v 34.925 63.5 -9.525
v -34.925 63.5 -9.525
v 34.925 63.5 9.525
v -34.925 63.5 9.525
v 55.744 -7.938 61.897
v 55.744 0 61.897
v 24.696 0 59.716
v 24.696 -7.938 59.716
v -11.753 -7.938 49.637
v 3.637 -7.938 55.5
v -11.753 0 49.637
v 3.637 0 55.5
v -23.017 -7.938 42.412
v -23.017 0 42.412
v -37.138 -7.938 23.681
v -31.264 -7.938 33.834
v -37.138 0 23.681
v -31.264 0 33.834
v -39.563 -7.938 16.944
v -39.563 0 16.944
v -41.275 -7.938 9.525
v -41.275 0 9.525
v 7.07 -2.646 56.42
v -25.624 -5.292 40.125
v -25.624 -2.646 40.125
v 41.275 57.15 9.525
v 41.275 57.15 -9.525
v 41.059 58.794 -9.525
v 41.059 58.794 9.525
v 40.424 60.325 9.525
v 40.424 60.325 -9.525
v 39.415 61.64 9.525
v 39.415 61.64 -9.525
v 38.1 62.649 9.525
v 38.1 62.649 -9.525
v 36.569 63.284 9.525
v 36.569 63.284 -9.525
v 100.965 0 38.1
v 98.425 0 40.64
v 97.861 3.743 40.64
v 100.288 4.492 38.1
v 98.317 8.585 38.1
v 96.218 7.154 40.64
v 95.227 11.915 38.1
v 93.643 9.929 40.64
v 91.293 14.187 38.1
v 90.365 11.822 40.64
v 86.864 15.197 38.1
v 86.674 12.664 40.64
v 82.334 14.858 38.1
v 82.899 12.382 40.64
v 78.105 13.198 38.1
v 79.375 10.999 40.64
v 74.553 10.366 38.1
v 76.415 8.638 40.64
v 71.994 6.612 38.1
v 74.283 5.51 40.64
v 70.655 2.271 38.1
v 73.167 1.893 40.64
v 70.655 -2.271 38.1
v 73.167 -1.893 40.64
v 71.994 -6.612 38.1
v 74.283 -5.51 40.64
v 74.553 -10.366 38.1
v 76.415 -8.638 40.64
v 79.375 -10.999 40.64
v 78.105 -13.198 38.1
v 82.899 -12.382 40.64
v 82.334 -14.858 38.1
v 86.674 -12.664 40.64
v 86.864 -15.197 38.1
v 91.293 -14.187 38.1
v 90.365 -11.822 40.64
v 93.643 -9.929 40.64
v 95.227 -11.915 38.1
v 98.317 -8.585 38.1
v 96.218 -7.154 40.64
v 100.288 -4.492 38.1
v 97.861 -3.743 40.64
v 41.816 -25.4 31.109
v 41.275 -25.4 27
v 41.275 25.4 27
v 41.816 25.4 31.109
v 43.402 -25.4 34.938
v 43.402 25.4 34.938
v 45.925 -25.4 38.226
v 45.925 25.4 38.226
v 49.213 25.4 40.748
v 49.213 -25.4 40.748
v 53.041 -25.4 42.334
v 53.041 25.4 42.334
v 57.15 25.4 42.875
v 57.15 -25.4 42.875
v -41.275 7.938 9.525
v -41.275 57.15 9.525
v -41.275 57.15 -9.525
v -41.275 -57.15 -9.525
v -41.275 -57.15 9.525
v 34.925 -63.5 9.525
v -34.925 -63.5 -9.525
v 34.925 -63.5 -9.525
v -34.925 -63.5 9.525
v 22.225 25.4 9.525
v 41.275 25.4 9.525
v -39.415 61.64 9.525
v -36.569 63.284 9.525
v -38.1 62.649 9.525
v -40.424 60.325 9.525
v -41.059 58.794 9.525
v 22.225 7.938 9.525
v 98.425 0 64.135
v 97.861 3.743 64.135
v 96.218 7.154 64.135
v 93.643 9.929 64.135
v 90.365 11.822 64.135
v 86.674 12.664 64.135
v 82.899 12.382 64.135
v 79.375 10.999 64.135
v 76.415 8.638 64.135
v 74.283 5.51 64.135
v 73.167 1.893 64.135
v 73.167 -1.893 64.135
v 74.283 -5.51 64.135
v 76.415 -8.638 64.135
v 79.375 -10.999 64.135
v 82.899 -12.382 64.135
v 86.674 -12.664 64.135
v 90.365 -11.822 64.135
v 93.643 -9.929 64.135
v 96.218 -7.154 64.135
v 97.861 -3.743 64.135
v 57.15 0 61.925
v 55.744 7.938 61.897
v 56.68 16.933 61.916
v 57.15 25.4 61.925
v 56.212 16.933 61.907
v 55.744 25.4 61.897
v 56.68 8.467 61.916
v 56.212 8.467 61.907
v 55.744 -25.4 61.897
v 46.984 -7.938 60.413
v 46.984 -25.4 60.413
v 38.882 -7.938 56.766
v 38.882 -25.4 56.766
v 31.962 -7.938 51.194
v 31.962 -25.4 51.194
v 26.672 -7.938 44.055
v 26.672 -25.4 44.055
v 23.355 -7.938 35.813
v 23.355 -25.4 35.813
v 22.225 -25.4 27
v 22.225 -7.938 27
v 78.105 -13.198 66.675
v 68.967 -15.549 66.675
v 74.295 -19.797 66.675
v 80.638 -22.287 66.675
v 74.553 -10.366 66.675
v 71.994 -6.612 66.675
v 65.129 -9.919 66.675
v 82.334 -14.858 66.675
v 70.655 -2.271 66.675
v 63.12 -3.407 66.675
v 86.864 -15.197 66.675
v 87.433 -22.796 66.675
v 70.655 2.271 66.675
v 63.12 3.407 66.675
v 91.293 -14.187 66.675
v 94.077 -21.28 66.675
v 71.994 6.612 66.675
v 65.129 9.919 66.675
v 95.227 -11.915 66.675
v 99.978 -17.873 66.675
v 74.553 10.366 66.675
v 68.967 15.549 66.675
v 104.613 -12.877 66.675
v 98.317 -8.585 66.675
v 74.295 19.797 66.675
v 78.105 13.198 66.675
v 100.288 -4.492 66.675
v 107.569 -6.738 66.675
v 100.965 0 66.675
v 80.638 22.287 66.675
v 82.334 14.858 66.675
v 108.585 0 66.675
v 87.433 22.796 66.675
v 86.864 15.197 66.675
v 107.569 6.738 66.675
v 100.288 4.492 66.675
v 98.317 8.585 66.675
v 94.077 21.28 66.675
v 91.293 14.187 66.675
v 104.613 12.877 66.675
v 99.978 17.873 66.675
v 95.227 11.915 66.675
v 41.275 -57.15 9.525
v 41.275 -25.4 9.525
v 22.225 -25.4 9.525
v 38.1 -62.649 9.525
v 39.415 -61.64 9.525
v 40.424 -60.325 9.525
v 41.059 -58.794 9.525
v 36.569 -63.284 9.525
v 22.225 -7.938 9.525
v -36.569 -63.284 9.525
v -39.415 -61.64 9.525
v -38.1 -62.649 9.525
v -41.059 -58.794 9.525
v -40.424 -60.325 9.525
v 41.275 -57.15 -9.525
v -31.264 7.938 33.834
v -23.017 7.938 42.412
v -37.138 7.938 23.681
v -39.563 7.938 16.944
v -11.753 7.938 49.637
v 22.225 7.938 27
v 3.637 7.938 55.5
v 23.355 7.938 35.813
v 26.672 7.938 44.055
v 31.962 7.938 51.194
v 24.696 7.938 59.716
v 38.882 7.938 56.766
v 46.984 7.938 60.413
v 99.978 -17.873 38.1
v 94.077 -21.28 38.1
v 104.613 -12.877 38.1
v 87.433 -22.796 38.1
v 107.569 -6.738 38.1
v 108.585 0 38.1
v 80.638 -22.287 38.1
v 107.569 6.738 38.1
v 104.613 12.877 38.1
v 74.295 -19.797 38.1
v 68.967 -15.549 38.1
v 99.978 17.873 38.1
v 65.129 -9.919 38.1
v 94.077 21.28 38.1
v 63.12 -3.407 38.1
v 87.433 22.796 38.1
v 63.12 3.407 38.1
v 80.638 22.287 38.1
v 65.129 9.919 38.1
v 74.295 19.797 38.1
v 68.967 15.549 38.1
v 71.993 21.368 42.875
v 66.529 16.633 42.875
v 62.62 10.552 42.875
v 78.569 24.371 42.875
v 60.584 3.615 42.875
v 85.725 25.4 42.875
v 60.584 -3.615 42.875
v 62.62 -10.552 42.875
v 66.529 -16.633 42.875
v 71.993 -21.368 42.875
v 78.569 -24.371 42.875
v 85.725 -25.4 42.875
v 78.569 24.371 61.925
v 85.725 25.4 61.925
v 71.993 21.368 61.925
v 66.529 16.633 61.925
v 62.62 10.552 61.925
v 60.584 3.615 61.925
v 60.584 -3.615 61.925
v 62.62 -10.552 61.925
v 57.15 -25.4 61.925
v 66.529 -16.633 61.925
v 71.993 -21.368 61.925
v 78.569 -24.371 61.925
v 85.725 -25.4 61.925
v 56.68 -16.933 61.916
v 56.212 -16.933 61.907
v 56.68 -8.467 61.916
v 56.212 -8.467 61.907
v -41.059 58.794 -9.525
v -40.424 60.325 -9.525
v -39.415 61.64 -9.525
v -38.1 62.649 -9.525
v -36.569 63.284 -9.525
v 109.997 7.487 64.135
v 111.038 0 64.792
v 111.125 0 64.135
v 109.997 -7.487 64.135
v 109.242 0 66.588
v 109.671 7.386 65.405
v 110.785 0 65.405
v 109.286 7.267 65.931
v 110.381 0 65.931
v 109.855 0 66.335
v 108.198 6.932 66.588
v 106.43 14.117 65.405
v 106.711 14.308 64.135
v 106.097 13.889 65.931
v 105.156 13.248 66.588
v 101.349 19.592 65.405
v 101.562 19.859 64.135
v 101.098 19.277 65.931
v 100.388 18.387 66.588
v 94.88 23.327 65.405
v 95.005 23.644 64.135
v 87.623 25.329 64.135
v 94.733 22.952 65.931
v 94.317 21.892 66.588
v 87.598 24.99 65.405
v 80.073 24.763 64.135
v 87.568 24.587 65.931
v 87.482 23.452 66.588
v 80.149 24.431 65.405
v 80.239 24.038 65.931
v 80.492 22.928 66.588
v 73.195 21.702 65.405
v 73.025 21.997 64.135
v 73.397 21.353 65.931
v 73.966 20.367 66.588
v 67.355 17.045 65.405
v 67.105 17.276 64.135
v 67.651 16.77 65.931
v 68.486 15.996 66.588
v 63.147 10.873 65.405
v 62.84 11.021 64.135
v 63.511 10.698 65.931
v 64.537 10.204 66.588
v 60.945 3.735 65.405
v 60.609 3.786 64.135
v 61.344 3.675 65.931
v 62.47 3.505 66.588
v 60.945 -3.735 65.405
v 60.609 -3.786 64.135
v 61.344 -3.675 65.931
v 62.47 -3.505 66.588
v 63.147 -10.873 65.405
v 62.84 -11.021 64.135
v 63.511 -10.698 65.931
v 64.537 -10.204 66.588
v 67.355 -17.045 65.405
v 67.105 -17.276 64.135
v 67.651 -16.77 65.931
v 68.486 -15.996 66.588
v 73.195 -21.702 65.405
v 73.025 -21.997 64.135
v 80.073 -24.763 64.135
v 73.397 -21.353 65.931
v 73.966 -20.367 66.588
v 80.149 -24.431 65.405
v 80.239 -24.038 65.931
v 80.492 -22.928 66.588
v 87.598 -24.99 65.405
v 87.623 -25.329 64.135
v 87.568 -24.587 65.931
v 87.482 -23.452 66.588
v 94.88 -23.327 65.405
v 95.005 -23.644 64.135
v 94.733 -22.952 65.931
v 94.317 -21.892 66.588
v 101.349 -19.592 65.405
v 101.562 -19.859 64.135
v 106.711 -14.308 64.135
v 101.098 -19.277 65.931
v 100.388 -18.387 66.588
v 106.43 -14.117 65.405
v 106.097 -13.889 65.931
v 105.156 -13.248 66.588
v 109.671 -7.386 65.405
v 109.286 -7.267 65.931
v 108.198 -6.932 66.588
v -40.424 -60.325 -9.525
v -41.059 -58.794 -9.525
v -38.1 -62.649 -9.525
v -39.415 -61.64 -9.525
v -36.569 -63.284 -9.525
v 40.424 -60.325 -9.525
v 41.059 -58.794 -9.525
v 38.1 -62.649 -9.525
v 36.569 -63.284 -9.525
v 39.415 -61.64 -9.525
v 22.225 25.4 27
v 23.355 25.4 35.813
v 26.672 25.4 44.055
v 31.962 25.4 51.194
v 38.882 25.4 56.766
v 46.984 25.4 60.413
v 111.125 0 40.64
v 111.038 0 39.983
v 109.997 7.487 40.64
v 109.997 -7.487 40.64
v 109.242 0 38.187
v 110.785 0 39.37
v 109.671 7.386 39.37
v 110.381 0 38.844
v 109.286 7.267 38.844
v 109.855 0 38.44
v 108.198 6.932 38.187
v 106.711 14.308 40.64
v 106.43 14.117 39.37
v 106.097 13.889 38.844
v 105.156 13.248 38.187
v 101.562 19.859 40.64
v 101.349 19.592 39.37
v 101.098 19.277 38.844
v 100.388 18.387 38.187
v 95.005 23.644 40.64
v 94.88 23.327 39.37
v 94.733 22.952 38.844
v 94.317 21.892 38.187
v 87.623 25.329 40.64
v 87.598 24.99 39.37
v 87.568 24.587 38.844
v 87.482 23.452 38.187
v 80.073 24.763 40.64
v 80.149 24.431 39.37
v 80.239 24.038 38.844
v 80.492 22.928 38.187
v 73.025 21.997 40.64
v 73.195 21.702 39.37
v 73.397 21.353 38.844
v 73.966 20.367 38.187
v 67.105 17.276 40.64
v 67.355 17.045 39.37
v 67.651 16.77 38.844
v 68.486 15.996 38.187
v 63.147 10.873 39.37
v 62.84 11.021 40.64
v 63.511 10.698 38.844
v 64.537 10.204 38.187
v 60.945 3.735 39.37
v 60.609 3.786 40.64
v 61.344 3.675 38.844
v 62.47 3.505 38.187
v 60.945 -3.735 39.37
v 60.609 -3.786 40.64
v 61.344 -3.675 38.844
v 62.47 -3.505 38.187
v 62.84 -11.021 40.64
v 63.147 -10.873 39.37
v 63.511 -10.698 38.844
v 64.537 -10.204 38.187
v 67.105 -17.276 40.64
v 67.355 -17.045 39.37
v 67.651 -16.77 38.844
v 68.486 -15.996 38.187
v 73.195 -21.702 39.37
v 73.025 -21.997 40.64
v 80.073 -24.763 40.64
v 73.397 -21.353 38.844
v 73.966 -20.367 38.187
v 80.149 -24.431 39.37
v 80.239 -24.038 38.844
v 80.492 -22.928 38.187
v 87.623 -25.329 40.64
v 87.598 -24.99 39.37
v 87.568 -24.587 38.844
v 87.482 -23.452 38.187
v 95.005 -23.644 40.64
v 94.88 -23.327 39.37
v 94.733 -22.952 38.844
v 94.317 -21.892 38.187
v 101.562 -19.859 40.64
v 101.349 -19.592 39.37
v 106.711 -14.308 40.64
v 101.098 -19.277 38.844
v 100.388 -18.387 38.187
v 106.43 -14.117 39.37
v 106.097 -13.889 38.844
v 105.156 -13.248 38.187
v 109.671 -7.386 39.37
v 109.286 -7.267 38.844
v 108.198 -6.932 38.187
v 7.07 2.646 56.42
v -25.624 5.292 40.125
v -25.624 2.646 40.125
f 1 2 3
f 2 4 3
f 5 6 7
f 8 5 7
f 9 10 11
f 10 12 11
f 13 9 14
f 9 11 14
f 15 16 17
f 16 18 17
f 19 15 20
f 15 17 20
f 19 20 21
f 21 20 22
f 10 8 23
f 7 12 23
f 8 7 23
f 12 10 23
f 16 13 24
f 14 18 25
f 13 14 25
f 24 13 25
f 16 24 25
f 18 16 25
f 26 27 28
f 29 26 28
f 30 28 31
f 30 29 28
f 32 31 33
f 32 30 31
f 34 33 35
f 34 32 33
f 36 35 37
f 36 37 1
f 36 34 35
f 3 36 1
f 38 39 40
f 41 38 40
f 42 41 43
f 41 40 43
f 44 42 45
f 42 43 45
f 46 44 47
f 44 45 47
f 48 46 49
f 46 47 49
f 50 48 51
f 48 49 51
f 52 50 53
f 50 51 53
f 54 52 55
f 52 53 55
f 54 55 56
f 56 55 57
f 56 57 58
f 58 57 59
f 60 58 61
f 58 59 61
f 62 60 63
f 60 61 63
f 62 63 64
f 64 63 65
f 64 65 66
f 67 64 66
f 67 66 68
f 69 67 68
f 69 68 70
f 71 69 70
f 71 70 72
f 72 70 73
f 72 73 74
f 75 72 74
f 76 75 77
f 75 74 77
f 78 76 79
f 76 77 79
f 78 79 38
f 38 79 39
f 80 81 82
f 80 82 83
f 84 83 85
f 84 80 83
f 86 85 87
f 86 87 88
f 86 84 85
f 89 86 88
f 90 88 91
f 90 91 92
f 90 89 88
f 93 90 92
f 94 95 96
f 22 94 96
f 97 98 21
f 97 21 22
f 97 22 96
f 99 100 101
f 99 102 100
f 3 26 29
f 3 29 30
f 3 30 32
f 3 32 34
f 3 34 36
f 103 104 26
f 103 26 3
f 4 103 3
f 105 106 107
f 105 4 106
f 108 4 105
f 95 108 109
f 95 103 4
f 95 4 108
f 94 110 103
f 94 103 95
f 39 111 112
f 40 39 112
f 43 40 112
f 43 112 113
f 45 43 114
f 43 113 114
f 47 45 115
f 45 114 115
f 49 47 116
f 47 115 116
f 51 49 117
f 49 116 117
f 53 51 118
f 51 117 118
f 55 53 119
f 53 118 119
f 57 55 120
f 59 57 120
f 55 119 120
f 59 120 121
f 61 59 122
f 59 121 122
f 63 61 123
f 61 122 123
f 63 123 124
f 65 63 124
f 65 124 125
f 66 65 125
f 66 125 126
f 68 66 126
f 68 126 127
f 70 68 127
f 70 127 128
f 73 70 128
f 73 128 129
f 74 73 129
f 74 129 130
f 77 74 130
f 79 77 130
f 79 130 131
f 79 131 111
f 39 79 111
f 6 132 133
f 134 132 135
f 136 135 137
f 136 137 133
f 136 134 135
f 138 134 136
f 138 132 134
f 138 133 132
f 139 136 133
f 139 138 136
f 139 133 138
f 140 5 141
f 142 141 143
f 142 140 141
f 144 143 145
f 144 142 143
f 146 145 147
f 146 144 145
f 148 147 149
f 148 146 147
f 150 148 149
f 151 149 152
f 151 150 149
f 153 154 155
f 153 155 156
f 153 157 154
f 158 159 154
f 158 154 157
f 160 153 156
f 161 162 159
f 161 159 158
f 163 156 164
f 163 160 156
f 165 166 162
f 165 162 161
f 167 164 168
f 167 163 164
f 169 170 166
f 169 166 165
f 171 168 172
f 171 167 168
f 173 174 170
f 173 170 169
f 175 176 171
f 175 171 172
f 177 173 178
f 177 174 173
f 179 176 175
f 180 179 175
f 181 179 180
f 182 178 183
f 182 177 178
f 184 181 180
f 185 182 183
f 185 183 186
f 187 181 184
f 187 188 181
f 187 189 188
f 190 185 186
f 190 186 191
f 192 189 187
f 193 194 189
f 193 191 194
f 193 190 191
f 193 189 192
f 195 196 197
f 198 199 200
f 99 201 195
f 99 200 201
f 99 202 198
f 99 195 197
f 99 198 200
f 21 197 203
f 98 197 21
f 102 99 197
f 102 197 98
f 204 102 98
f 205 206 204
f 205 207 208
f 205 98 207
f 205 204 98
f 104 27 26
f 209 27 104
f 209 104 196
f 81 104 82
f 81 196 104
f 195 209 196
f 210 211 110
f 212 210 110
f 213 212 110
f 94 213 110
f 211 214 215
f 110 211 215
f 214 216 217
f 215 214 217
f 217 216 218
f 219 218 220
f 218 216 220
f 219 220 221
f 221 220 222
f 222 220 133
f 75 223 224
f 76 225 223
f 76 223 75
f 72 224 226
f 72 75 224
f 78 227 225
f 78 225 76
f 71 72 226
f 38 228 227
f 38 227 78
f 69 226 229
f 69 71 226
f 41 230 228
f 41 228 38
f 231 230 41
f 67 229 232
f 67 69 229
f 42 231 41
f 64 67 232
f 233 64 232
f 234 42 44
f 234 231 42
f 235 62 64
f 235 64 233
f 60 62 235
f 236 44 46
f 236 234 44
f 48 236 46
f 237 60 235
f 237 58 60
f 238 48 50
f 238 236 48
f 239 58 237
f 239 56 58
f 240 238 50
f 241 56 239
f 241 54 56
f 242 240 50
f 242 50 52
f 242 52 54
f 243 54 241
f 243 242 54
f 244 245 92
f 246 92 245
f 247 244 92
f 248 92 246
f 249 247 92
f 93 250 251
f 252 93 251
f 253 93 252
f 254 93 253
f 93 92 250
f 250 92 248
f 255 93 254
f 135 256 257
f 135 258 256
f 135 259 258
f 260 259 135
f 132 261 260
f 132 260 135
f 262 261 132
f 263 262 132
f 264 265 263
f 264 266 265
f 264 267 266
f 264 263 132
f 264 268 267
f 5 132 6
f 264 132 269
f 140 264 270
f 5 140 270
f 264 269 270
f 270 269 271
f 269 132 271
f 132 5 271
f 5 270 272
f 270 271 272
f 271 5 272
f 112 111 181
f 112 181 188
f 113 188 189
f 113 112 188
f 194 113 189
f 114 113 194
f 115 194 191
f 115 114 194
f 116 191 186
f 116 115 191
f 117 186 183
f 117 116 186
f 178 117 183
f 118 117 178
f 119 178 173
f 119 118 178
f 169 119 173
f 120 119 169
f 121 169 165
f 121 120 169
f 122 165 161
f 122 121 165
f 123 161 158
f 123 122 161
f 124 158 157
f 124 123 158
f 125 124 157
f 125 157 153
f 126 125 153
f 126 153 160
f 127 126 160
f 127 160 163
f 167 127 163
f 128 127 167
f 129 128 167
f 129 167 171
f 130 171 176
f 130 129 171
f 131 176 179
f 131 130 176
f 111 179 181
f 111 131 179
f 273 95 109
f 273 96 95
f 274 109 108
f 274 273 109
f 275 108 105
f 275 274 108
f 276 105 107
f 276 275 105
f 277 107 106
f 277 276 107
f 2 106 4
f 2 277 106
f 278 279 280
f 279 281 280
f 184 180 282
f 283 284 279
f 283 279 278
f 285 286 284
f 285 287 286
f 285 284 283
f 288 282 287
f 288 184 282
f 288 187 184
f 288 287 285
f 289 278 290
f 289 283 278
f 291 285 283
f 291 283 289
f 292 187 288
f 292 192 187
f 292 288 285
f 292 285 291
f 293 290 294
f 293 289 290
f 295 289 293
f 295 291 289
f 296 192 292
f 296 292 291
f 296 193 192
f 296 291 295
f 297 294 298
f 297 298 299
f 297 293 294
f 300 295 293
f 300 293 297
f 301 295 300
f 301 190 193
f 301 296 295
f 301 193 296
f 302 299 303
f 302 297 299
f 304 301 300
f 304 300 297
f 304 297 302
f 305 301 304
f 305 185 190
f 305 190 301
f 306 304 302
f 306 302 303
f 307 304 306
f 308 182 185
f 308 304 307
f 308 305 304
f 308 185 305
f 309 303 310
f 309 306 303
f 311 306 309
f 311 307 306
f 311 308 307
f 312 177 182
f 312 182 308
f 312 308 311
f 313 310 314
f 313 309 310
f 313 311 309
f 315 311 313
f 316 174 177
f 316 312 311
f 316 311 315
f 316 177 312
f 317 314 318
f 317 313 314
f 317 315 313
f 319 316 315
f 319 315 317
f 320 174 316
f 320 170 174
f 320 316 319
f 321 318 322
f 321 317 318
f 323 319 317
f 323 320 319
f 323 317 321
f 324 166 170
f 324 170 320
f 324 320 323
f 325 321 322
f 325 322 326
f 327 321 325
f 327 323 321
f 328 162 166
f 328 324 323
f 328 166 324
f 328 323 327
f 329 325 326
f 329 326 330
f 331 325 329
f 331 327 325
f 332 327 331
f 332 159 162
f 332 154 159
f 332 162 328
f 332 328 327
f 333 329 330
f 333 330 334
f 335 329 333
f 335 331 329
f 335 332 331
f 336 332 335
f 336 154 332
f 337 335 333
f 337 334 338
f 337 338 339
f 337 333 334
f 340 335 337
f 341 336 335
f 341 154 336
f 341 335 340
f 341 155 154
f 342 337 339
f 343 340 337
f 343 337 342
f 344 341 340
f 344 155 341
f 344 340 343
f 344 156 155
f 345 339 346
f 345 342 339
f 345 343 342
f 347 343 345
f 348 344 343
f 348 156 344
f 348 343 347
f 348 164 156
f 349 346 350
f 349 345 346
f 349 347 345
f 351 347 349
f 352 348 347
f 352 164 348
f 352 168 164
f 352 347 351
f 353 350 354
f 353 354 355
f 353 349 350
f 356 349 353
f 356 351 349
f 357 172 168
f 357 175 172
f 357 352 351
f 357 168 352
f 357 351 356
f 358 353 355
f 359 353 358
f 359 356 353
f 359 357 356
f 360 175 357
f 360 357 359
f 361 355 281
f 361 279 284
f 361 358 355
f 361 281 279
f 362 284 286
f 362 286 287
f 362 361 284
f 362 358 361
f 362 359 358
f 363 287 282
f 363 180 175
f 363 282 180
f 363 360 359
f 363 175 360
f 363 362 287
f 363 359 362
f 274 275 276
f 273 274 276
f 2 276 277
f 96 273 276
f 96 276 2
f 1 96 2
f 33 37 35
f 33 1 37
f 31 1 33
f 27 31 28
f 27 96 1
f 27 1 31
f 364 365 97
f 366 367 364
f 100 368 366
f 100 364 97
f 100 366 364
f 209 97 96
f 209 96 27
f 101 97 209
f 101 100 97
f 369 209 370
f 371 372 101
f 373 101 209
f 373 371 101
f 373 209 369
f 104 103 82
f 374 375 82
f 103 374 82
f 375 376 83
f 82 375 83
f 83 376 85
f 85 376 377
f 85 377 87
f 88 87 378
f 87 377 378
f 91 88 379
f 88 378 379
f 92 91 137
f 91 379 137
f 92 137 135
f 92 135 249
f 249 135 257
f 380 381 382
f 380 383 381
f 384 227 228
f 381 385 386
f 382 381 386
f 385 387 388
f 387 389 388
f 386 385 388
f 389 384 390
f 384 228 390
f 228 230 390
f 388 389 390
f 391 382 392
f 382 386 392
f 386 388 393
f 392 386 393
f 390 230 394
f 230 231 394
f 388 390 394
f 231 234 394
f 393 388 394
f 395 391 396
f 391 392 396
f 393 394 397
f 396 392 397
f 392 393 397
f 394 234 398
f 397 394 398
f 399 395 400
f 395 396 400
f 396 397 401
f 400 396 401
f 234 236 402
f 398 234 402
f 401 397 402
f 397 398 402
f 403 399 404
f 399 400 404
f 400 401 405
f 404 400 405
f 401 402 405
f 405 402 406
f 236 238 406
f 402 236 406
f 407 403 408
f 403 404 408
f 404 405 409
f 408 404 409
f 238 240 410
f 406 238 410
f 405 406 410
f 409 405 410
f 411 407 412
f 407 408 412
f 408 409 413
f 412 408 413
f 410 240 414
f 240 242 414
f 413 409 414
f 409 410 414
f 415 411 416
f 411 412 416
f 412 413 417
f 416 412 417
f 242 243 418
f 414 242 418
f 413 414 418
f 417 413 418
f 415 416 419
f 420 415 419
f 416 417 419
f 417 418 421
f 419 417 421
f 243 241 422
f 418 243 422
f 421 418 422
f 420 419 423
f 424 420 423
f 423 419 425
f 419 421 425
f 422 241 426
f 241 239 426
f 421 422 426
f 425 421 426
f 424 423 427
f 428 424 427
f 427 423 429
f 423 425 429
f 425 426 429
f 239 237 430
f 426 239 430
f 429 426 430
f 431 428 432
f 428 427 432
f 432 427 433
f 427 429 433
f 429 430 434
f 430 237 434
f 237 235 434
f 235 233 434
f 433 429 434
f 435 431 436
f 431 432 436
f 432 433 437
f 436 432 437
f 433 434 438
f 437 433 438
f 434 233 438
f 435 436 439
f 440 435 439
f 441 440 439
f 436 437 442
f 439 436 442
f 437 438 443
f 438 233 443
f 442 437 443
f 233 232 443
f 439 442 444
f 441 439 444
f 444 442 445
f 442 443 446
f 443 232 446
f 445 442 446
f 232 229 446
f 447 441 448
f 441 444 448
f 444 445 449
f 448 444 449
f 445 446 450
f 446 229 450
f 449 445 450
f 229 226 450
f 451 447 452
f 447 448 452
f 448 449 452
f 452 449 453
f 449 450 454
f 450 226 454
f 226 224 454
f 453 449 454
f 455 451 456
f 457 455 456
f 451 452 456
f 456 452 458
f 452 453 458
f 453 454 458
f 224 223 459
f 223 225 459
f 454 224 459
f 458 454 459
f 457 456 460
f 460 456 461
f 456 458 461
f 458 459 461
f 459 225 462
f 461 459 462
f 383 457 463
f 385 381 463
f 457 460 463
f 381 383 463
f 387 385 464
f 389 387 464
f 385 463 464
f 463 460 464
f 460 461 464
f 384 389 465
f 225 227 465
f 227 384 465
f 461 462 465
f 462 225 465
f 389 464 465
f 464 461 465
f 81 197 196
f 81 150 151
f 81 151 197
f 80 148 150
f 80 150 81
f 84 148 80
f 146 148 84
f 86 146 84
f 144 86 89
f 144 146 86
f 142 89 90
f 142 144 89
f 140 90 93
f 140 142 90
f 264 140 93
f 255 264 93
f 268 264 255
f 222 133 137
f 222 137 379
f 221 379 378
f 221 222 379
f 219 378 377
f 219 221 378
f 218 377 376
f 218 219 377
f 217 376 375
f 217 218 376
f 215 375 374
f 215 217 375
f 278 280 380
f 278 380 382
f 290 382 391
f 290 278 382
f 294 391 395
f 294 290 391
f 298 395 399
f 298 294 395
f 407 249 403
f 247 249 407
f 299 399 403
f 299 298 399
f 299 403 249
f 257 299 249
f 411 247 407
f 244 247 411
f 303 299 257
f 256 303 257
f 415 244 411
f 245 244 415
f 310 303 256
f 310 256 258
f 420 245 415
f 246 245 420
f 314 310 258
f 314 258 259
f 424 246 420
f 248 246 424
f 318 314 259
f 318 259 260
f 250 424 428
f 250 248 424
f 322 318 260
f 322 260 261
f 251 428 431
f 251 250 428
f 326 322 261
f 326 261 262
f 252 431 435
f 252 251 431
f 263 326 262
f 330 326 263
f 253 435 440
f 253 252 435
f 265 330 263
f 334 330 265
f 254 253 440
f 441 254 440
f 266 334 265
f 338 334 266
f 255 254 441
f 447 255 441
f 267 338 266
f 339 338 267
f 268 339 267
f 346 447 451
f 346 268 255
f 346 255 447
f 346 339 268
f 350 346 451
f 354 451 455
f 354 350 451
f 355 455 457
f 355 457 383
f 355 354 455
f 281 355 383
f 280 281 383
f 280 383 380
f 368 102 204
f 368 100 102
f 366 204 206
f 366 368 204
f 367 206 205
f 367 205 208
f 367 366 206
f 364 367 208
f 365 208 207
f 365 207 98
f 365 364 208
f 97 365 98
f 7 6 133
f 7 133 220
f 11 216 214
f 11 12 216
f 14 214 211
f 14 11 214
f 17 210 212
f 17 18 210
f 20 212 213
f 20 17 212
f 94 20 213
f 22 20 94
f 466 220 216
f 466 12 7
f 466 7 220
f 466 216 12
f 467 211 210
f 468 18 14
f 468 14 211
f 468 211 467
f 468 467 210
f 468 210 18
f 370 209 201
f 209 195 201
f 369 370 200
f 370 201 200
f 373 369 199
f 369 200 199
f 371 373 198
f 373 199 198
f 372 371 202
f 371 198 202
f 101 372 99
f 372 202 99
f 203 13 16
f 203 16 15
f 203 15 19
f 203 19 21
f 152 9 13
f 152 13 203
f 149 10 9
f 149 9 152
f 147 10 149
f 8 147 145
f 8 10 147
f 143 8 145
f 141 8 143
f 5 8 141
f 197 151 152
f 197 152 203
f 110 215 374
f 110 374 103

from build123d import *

# Parameters (mm, degrees)
F1_DEPTH = 63.5
F0_W     = 25.4
F0_H     = 19.05
F2_DEPTH = 25.4
F3_DEPTH = 7.9375
F5_R     = 6.35
F6_R     = 12.7
F7_DEPTH = 76.201
F8_R     = 2.54
F9_SIZE  = 2.54


with BuildPart() as f1:
    # F0 (on Front) → F1 (new body, symmetric)
    with BuildSketch(Plane.XZ):
        Polygon((-41.275, -9.525), (41.275, -9.525), (41.275, 9.525), (22.225, 9.525), (-41.275, 9.525), align=None)
    extrude(amount=F1_DEPTH, both=True)

    # F0 (on Front) → F2 (join, symmetric)
    with BuildSketch(Plane.XZ):
        with BuildLine():
            Line((22.225, 9.525), (41.275, 9.525))
            Line((41.275, 9.525), (41.275, 27.0002))
            ThreePointArc((41.275, 27.0002), (45.9246798487, 38.2255201513), (57.15, 42.8752))
            Line((57.15, 42.8752), (60.325, 42.8752))
            Line((60.325, 42.8752), (60.325, 61.9252))
            Line((60.325, 61.9252), (57.15, 61.9252))
            add(Edge.make_bspline(
                [(57.15, 61.9252), (56.6797844251, 61.9165132353), (56.2111060081, 61.9070782377), (55.7439674805, 61.896886054)],
                knots=[0, 0, 0, 0, 0.9174307887, 0.9174307887, 0.9174307887, 0.9174307887], degree=3))
            ThreePointArc((55.7439674805, 61.896886054), (31.9620930728, 51.1936902325), (22.225, 27.0002))
            Line((22.225, 27.0002), (22.225, 9.525))
        make_face()
        with Locations((73.025, 52.4002)):
            Rectangle(F0_W, F0_H)
    extrude(amount=F2_DEPTH, both=True)

    # F0 (on Front) → F3 (join, symmetric)
    with BuildSketch(Plane.XZ):
        with BuildLine():
            add(Edge.make_bspline(
                [(55.7439674805, 61.896886054), (-0.5649096696, 60.6683202624), (-34.4993601081, 48.437924622), (-41.275, 9.525)],
                knots=[0.9174307887, 0.9174307887, 0.9174307887, 0.9174307887, 111.5045361635, 111.5045361635, 111.5045361635, 111.5045361635], degree=3))
            Line((-41.275, 9.525), (22.225, 9.525))
            Line((22.225, 9.525), (22.225, 27.0002))
            ThreePointArc((22.225, 27.0002), (31.9620930728, 51.1936902325), (55.7439674805, 61.896886054))
        make_face()
    extrude(amount=F3_DEPTH, both=True)

    # F0 (on Front) → F4 (revolve)
    with BuildSketch(Plane.XZ):
        Polygon((85.725, 61.9252), (85.725, 42.8752), (85.725, 38.1), (111.125, 38.1), (111.125, 66.675), (85.725, 66.675), align=None)
    revolve(axis=Axis((85.725, 0, 52.3875), (0, 0, 1)))

    # F5
    f5_edges = [f1.edges().sort_by_distance(p)[0] for p in [
        (-41.275, -63.5, 0),
        (41.275, -63.5, 0),
        (41.275, 63.5, 0),
        (-41.275, 63.5, 0),
    ]]
    fillet(f5_edges, radius=F5_R)

    # F6 (on face) → F7 (cut, through all)
    with BuildSketch(Plane.XY.offset(66.675)):
        with Locations((85.725, 0)):
            Circle(F6_R)
    extrude(amount=-F7_DEPTH, mode=Mode.SUBTRACT)

    # F8
    f8_edges = [f1.edges().sort_by_distance(p)[0] for p in [
        (60.325, 0, 66.675),
        (60.325, 0, 38.1),
    ]]
    fillet(f8_edges, radius=F8_R)

    # F9
    f9_edges = [f1.edges().sort_by_distance(p)[0] for p in [
        (73.025, 0, 66.675),
        (73.025, 0, 38.1),
    ]]
    chamfer(f9_edges, length=F9_SIZE)


solid = f1.part
